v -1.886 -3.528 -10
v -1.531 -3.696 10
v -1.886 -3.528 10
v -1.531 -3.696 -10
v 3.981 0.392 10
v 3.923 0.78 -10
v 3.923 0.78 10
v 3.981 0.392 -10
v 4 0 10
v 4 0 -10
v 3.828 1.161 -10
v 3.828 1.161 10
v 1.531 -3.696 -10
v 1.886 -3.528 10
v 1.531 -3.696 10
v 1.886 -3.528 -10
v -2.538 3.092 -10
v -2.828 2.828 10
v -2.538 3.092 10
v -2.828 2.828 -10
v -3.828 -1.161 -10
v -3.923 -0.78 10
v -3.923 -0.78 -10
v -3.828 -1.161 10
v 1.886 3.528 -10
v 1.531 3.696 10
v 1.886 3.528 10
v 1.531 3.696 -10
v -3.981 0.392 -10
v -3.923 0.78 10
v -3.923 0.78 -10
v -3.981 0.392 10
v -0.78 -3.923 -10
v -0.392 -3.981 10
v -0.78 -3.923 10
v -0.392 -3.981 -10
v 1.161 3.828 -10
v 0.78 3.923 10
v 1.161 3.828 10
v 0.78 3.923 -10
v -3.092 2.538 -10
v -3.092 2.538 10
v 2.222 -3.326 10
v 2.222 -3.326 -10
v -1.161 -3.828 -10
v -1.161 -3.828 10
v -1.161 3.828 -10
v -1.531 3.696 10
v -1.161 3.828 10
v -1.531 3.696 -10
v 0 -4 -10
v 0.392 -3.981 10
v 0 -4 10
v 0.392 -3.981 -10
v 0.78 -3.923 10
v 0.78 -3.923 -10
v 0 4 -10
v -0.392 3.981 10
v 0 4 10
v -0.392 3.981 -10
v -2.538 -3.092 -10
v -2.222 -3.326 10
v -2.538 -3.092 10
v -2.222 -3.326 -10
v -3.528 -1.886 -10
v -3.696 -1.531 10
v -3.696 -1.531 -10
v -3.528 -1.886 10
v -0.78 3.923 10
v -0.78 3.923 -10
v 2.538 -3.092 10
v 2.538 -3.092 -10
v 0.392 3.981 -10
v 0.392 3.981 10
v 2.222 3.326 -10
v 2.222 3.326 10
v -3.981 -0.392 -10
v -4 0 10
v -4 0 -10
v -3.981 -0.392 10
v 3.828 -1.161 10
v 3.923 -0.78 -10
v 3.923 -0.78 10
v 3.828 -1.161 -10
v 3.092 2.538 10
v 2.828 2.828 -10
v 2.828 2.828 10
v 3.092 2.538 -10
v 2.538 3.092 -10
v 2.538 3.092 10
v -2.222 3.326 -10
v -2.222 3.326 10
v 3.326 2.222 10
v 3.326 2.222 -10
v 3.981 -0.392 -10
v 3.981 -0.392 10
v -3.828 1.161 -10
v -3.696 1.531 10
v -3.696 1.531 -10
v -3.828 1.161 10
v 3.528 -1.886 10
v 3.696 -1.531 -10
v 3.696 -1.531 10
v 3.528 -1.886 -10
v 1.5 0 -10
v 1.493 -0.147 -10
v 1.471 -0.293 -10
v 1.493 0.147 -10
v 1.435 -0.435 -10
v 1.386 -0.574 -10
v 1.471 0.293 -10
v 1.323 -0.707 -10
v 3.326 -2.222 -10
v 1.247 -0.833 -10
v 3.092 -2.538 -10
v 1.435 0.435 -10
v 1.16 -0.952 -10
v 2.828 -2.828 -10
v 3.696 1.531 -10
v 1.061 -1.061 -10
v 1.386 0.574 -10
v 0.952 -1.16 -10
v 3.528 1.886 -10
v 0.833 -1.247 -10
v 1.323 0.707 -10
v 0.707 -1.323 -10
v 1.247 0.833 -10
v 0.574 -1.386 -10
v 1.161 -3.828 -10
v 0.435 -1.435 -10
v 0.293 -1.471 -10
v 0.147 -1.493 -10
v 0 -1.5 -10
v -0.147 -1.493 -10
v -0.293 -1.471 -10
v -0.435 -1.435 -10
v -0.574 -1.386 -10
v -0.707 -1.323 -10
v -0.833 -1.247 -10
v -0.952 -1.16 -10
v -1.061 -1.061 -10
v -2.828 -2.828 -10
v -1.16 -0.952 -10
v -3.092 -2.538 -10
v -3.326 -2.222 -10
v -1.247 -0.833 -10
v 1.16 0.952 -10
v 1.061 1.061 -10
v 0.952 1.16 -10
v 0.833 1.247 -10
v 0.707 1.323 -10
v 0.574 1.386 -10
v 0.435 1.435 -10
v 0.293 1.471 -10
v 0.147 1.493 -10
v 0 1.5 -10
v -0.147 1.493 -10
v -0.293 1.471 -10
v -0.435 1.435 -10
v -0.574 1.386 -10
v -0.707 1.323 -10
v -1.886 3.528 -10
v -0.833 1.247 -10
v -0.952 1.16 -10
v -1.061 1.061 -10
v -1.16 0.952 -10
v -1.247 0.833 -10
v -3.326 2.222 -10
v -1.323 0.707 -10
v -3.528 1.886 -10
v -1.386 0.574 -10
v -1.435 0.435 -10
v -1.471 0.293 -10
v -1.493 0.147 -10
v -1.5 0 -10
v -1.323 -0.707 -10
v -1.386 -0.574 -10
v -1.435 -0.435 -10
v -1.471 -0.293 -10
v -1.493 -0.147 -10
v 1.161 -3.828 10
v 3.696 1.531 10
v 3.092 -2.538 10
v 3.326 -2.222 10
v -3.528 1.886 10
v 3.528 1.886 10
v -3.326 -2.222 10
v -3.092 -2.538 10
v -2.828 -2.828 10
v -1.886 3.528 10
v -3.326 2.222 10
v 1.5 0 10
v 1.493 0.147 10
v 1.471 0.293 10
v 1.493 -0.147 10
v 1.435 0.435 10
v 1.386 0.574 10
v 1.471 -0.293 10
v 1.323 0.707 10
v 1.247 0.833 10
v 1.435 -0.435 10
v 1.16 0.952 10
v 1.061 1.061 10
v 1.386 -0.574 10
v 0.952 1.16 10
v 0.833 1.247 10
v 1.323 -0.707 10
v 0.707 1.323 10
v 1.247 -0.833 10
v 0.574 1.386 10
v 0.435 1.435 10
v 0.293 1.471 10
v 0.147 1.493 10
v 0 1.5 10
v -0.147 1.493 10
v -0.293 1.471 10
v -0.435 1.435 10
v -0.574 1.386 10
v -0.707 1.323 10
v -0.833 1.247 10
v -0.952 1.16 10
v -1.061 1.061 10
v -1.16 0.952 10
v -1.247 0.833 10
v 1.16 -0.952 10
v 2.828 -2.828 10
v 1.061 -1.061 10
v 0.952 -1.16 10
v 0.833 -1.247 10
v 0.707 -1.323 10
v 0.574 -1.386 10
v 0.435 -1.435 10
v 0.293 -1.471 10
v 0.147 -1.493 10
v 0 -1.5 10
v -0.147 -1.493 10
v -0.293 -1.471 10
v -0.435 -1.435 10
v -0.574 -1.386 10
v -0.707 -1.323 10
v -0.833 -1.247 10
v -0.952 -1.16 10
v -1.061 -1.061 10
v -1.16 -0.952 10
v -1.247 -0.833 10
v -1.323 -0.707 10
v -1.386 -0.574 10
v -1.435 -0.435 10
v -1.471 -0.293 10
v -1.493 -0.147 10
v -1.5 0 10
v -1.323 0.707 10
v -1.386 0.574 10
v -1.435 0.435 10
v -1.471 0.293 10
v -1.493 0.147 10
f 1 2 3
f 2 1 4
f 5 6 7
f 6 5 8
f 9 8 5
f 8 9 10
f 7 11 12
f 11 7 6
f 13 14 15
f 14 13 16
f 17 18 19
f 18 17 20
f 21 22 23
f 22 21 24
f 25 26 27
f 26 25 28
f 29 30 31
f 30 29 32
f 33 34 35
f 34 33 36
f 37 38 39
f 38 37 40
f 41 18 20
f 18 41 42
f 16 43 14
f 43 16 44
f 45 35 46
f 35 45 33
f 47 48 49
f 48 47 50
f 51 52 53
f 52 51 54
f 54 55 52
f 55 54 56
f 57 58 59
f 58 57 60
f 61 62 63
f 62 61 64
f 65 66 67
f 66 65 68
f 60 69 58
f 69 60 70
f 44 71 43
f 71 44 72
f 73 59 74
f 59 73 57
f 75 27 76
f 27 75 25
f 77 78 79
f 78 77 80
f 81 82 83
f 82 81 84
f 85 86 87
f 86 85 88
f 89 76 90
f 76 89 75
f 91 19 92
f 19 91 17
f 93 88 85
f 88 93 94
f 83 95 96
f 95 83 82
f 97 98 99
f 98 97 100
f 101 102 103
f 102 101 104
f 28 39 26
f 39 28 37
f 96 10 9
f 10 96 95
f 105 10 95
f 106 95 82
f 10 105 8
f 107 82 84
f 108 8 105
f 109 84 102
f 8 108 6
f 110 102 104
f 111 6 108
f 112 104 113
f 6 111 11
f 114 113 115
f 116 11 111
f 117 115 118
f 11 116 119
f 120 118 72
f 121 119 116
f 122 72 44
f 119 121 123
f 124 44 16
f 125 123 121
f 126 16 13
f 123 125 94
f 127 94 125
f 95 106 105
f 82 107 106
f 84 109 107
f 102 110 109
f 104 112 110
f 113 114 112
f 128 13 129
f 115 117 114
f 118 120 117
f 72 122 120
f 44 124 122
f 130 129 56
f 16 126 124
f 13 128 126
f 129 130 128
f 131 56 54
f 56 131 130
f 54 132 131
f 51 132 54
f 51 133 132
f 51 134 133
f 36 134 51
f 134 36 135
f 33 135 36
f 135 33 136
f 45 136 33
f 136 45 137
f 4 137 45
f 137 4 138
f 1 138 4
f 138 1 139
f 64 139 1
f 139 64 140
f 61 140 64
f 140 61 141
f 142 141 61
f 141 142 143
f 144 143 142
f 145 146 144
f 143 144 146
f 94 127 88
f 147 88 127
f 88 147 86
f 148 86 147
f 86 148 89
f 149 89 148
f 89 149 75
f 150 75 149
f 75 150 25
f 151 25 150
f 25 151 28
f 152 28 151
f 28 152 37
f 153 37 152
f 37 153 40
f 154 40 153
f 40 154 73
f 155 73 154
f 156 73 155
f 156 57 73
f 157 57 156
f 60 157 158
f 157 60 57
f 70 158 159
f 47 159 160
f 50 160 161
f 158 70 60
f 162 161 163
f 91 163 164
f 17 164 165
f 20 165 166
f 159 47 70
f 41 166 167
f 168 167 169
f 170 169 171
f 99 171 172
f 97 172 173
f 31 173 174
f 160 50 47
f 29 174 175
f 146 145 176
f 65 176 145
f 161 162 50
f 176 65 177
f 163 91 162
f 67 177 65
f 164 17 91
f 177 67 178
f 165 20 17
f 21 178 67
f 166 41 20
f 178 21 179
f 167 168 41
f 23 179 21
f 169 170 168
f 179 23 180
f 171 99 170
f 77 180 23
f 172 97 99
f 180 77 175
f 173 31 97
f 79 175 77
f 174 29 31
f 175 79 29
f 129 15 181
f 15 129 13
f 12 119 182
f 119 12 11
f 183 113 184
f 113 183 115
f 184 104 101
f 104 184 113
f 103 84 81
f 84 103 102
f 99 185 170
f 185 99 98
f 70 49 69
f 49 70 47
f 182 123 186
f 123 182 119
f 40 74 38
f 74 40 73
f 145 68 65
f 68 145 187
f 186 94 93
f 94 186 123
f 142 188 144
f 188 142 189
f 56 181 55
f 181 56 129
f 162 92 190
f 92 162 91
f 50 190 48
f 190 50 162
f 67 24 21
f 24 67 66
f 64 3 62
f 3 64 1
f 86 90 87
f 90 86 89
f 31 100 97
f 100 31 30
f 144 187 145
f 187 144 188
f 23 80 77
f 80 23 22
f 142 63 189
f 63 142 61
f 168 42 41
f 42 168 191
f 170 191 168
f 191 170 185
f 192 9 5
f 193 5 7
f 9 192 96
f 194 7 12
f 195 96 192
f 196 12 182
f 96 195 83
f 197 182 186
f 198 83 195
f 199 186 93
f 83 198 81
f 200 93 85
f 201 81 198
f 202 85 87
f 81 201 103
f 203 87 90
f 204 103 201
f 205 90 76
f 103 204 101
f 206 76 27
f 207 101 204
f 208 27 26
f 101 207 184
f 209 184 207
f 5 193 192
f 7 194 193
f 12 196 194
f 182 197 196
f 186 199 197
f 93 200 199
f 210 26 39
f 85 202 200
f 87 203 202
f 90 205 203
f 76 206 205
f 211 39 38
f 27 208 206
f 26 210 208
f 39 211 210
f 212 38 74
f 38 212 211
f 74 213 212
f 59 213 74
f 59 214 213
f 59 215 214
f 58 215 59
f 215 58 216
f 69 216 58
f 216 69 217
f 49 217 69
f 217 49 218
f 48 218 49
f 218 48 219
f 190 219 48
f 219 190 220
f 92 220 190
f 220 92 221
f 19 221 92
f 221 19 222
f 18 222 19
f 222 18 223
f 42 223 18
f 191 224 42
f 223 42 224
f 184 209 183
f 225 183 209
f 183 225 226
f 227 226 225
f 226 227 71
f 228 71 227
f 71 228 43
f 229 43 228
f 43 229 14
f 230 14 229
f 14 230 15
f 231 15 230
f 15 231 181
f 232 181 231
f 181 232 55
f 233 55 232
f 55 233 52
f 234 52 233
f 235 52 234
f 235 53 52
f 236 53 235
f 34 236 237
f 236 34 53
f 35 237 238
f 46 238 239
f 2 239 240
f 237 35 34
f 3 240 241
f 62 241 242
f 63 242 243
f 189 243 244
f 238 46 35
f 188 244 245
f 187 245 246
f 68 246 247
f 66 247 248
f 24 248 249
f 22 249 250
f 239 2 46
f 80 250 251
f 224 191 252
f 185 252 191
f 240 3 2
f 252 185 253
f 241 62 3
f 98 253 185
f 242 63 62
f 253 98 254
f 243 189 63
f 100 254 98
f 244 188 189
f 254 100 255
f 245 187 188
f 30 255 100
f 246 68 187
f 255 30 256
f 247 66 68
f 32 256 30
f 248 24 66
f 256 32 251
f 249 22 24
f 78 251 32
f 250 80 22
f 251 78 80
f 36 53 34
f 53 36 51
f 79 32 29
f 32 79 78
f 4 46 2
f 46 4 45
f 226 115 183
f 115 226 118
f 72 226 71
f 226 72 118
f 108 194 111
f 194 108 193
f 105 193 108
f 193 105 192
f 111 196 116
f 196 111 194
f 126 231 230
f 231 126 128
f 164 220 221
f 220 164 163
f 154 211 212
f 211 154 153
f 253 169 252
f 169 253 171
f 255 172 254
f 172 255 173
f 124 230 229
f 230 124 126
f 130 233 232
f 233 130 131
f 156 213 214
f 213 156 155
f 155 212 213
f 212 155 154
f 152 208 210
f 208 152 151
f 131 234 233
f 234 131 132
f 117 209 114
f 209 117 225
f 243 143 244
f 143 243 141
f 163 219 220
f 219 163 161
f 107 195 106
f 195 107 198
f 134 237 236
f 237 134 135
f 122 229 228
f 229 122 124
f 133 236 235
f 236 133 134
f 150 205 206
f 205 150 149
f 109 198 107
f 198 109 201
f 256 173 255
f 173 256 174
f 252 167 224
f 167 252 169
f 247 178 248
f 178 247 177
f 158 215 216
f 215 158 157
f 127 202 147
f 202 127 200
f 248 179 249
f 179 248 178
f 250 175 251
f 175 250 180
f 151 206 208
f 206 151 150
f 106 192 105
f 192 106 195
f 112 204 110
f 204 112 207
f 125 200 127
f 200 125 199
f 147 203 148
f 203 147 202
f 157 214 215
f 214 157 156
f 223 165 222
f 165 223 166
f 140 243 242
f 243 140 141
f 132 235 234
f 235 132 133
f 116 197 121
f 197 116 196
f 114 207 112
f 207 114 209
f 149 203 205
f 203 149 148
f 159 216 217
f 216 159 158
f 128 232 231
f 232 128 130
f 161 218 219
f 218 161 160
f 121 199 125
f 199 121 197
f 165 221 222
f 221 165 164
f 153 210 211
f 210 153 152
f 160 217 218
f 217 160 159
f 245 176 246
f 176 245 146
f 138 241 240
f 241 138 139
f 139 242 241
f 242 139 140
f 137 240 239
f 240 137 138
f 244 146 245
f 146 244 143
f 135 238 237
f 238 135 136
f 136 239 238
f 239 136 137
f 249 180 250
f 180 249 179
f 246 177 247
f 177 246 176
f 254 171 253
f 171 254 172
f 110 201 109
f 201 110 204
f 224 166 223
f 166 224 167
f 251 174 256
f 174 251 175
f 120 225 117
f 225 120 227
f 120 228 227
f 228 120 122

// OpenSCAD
// Parameters
thread_diameter_mm = 3.0; //[1.5:6.0:0.1]
length_mm = 20.0; //[10.0:40.0:0.5]
outer_diameter_mm = 8.0; //[4.0:16.0:0.5]
threaded_length_mm = 20.0; //[5.0:40.0:0.5]
eps_mm = 0.8; //[0.2:2.0:0.1]

// Pillar - complete geometry
module pillar() {
  color("Silver") {
    // Body
    cylinder(h=length_mm, r=outer_diameter_mm/2, center=true, $fn=64);
  }
}

// Standoff - complete geometry
module standoff() {
  color("DimGray") {
    difference() {
      // Outer body
      pillar();
      // Threaded feature (hole)
      cylinder(h=threaded_length_mm + 2*eps_mm, r=thread_diameter_mm/2, center=true, $fn=64);
    }
  }
}

// Assembly
module assembly() {
  standoff();
}

assembly();
